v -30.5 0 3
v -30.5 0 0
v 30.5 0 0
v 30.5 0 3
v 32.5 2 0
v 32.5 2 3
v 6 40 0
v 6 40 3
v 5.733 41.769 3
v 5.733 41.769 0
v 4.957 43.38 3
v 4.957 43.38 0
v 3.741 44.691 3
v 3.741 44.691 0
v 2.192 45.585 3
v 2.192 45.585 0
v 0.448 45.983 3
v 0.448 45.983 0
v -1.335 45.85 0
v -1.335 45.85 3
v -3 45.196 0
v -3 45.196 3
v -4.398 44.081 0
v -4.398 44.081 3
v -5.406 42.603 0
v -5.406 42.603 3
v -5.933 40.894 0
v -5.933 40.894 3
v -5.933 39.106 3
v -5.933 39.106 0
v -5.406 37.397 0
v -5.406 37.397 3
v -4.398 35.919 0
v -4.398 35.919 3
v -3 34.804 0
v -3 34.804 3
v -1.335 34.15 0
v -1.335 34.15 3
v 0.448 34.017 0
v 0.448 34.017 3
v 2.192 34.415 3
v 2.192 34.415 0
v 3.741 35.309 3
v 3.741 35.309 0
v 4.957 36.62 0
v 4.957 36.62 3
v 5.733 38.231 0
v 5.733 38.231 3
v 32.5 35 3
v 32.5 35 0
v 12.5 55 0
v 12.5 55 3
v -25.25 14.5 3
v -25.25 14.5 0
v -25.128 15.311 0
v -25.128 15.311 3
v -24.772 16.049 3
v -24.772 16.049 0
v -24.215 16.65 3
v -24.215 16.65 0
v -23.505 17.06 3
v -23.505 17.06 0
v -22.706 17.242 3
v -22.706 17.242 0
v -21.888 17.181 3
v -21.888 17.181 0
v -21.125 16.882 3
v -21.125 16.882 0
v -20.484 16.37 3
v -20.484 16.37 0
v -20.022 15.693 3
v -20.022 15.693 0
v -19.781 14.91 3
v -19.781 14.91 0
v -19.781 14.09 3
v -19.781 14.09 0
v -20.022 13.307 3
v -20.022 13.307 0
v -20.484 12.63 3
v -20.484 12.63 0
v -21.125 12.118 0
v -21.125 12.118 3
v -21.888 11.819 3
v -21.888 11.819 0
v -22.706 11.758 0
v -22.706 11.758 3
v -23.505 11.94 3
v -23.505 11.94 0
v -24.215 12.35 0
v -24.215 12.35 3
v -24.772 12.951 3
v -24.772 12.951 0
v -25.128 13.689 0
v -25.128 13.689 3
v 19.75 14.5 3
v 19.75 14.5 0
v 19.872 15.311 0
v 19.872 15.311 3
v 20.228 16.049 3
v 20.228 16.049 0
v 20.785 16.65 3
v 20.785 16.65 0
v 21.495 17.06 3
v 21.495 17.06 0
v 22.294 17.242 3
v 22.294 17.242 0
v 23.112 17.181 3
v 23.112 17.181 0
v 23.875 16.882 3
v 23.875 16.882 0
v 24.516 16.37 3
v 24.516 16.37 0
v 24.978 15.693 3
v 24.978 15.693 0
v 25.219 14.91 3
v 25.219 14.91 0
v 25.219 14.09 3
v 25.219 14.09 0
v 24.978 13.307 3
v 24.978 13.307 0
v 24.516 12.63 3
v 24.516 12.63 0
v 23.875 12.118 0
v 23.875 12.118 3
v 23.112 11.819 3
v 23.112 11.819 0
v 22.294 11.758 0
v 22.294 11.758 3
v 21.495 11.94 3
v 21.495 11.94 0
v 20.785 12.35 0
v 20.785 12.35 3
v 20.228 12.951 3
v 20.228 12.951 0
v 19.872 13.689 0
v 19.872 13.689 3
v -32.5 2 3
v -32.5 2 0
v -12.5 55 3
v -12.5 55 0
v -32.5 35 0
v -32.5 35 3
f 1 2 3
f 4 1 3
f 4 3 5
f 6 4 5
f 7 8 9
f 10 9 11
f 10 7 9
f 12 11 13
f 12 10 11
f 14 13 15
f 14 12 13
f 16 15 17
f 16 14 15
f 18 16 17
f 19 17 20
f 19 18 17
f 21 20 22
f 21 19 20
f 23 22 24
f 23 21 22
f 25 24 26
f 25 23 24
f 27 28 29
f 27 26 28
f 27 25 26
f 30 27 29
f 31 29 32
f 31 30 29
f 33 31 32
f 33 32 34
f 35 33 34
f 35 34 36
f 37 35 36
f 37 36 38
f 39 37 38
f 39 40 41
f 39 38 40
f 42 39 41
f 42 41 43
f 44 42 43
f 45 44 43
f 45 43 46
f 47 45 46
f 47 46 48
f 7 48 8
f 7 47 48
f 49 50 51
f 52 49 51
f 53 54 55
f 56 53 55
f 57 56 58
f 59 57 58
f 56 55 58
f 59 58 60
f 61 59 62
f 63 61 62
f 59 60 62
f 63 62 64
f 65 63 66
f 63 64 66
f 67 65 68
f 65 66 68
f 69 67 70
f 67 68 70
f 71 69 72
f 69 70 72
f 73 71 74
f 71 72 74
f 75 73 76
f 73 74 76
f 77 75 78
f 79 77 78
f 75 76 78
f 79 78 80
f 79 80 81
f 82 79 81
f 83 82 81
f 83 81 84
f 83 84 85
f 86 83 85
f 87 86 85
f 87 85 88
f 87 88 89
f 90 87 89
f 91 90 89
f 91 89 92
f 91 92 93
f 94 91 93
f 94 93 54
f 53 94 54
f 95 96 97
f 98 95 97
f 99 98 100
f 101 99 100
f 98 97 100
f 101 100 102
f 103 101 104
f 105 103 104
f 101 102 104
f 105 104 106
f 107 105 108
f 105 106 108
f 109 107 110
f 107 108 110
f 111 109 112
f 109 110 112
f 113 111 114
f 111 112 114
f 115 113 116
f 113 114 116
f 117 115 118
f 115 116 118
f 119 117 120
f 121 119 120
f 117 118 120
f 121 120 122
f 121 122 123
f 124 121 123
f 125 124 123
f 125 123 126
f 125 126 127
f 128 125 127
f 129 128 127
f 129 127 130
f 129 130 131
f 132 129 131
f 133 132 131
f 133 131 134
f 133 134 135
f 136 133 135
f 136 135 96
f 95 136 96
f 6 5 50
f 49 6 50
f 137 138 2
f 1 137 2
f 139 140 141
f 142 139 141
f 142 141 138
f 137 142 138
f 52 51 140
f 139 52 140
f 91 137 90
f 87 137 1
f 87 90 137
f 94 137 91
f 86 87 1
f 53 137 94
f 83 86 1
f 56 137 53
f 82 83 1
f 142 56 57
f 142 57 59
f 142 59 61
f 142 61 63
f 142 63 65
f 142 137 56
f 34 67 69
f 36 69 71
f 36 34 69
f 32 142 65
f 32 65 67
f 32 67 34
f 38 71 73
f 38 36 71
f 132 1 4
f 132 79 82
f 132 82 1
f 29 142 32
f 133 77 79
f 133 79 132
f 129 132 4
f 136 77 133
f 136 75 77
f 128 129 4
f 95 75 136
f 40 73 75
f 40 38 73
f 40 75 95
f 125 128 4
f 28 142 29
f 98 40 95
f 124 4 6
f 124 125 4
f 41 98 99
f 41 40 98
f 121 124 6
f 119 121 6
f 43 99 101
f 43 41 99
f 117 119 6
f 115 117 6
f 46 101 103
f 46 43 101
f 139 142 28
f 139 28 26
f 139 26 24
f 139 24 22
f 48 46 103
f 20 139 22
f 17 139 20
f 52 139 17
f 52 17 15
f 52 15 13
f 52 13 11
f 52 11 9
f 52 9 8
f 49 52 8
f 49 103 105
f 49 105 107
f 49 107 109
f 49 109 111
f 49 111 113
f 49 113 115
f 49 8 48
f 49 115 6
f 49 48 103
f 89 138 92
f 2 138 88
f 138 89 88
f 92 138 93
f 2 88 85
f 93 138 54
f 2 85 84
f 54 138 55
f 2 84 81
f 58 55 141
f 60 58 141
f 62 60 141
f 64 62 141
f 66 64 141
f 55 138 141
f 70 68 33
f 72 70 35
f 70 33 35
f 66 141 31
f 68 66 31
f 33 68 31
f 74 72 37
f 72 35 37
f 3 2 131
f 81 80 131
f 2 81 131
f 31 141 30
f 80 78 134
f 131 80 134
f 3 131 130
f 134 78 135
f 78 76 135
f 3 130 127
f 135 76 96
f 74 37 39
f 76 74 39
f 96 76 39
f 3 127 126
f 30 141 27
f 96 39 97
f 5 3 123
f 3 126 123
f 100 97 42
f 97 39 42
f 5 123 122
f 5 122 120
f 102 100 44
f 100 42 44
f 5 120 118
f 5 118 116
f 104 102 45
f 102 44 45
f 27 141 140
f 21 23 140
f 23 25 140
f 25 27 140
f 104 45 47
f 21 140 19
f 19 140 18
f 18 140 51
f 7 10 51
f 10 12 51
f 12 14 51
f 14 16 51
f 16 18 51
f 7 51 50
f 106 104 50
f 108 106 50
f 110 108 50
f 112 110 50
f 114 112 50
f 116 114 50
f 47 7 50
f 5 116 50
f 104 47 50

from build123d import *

# Parameters (mm, degrees)
BOSS_EXTRUDE1_DEPTH  = 3
SKETCH2_R            = 6
CUT_EXTRUDE1_DEPTH   = 4
M5_CLEARANCE_HOLE1_D = 5.5


with BuildPart() as part:
    # Sketch1 → Boss-Extrude1 (new body)
    with BuildSketch(Plane.XY):
        Polygon((-12.5, 55), (-32.5, 35), (-32.5, 2), (-30.5, 0), (30.5, 0), (32.5, 2), (32.5, 35), (12.5, 55), align=None)
    extrude(amount=BOSS_EXTRUDE1_DEPTH)

    # Sketch2 → Cut-Extrude1 (cut, through all)
    with BuildSketch(Plane.XY):
        with Locations((0, 40)):
            Circle(SKETCH2_R)
    extrude(amount=CUT_EXTRUDE1_DEPTH, mode=Mode.SUBTRACT)

    # M5 Clearance Hole1 (through all)
    with Locations(Plane.XY.offset(3)):
        with Locations((-22.5, 14.5), (22.5, 14.5)):
            Hole(M5_CLEARANCE_HOLE1_D / 2)


solid = part.part
